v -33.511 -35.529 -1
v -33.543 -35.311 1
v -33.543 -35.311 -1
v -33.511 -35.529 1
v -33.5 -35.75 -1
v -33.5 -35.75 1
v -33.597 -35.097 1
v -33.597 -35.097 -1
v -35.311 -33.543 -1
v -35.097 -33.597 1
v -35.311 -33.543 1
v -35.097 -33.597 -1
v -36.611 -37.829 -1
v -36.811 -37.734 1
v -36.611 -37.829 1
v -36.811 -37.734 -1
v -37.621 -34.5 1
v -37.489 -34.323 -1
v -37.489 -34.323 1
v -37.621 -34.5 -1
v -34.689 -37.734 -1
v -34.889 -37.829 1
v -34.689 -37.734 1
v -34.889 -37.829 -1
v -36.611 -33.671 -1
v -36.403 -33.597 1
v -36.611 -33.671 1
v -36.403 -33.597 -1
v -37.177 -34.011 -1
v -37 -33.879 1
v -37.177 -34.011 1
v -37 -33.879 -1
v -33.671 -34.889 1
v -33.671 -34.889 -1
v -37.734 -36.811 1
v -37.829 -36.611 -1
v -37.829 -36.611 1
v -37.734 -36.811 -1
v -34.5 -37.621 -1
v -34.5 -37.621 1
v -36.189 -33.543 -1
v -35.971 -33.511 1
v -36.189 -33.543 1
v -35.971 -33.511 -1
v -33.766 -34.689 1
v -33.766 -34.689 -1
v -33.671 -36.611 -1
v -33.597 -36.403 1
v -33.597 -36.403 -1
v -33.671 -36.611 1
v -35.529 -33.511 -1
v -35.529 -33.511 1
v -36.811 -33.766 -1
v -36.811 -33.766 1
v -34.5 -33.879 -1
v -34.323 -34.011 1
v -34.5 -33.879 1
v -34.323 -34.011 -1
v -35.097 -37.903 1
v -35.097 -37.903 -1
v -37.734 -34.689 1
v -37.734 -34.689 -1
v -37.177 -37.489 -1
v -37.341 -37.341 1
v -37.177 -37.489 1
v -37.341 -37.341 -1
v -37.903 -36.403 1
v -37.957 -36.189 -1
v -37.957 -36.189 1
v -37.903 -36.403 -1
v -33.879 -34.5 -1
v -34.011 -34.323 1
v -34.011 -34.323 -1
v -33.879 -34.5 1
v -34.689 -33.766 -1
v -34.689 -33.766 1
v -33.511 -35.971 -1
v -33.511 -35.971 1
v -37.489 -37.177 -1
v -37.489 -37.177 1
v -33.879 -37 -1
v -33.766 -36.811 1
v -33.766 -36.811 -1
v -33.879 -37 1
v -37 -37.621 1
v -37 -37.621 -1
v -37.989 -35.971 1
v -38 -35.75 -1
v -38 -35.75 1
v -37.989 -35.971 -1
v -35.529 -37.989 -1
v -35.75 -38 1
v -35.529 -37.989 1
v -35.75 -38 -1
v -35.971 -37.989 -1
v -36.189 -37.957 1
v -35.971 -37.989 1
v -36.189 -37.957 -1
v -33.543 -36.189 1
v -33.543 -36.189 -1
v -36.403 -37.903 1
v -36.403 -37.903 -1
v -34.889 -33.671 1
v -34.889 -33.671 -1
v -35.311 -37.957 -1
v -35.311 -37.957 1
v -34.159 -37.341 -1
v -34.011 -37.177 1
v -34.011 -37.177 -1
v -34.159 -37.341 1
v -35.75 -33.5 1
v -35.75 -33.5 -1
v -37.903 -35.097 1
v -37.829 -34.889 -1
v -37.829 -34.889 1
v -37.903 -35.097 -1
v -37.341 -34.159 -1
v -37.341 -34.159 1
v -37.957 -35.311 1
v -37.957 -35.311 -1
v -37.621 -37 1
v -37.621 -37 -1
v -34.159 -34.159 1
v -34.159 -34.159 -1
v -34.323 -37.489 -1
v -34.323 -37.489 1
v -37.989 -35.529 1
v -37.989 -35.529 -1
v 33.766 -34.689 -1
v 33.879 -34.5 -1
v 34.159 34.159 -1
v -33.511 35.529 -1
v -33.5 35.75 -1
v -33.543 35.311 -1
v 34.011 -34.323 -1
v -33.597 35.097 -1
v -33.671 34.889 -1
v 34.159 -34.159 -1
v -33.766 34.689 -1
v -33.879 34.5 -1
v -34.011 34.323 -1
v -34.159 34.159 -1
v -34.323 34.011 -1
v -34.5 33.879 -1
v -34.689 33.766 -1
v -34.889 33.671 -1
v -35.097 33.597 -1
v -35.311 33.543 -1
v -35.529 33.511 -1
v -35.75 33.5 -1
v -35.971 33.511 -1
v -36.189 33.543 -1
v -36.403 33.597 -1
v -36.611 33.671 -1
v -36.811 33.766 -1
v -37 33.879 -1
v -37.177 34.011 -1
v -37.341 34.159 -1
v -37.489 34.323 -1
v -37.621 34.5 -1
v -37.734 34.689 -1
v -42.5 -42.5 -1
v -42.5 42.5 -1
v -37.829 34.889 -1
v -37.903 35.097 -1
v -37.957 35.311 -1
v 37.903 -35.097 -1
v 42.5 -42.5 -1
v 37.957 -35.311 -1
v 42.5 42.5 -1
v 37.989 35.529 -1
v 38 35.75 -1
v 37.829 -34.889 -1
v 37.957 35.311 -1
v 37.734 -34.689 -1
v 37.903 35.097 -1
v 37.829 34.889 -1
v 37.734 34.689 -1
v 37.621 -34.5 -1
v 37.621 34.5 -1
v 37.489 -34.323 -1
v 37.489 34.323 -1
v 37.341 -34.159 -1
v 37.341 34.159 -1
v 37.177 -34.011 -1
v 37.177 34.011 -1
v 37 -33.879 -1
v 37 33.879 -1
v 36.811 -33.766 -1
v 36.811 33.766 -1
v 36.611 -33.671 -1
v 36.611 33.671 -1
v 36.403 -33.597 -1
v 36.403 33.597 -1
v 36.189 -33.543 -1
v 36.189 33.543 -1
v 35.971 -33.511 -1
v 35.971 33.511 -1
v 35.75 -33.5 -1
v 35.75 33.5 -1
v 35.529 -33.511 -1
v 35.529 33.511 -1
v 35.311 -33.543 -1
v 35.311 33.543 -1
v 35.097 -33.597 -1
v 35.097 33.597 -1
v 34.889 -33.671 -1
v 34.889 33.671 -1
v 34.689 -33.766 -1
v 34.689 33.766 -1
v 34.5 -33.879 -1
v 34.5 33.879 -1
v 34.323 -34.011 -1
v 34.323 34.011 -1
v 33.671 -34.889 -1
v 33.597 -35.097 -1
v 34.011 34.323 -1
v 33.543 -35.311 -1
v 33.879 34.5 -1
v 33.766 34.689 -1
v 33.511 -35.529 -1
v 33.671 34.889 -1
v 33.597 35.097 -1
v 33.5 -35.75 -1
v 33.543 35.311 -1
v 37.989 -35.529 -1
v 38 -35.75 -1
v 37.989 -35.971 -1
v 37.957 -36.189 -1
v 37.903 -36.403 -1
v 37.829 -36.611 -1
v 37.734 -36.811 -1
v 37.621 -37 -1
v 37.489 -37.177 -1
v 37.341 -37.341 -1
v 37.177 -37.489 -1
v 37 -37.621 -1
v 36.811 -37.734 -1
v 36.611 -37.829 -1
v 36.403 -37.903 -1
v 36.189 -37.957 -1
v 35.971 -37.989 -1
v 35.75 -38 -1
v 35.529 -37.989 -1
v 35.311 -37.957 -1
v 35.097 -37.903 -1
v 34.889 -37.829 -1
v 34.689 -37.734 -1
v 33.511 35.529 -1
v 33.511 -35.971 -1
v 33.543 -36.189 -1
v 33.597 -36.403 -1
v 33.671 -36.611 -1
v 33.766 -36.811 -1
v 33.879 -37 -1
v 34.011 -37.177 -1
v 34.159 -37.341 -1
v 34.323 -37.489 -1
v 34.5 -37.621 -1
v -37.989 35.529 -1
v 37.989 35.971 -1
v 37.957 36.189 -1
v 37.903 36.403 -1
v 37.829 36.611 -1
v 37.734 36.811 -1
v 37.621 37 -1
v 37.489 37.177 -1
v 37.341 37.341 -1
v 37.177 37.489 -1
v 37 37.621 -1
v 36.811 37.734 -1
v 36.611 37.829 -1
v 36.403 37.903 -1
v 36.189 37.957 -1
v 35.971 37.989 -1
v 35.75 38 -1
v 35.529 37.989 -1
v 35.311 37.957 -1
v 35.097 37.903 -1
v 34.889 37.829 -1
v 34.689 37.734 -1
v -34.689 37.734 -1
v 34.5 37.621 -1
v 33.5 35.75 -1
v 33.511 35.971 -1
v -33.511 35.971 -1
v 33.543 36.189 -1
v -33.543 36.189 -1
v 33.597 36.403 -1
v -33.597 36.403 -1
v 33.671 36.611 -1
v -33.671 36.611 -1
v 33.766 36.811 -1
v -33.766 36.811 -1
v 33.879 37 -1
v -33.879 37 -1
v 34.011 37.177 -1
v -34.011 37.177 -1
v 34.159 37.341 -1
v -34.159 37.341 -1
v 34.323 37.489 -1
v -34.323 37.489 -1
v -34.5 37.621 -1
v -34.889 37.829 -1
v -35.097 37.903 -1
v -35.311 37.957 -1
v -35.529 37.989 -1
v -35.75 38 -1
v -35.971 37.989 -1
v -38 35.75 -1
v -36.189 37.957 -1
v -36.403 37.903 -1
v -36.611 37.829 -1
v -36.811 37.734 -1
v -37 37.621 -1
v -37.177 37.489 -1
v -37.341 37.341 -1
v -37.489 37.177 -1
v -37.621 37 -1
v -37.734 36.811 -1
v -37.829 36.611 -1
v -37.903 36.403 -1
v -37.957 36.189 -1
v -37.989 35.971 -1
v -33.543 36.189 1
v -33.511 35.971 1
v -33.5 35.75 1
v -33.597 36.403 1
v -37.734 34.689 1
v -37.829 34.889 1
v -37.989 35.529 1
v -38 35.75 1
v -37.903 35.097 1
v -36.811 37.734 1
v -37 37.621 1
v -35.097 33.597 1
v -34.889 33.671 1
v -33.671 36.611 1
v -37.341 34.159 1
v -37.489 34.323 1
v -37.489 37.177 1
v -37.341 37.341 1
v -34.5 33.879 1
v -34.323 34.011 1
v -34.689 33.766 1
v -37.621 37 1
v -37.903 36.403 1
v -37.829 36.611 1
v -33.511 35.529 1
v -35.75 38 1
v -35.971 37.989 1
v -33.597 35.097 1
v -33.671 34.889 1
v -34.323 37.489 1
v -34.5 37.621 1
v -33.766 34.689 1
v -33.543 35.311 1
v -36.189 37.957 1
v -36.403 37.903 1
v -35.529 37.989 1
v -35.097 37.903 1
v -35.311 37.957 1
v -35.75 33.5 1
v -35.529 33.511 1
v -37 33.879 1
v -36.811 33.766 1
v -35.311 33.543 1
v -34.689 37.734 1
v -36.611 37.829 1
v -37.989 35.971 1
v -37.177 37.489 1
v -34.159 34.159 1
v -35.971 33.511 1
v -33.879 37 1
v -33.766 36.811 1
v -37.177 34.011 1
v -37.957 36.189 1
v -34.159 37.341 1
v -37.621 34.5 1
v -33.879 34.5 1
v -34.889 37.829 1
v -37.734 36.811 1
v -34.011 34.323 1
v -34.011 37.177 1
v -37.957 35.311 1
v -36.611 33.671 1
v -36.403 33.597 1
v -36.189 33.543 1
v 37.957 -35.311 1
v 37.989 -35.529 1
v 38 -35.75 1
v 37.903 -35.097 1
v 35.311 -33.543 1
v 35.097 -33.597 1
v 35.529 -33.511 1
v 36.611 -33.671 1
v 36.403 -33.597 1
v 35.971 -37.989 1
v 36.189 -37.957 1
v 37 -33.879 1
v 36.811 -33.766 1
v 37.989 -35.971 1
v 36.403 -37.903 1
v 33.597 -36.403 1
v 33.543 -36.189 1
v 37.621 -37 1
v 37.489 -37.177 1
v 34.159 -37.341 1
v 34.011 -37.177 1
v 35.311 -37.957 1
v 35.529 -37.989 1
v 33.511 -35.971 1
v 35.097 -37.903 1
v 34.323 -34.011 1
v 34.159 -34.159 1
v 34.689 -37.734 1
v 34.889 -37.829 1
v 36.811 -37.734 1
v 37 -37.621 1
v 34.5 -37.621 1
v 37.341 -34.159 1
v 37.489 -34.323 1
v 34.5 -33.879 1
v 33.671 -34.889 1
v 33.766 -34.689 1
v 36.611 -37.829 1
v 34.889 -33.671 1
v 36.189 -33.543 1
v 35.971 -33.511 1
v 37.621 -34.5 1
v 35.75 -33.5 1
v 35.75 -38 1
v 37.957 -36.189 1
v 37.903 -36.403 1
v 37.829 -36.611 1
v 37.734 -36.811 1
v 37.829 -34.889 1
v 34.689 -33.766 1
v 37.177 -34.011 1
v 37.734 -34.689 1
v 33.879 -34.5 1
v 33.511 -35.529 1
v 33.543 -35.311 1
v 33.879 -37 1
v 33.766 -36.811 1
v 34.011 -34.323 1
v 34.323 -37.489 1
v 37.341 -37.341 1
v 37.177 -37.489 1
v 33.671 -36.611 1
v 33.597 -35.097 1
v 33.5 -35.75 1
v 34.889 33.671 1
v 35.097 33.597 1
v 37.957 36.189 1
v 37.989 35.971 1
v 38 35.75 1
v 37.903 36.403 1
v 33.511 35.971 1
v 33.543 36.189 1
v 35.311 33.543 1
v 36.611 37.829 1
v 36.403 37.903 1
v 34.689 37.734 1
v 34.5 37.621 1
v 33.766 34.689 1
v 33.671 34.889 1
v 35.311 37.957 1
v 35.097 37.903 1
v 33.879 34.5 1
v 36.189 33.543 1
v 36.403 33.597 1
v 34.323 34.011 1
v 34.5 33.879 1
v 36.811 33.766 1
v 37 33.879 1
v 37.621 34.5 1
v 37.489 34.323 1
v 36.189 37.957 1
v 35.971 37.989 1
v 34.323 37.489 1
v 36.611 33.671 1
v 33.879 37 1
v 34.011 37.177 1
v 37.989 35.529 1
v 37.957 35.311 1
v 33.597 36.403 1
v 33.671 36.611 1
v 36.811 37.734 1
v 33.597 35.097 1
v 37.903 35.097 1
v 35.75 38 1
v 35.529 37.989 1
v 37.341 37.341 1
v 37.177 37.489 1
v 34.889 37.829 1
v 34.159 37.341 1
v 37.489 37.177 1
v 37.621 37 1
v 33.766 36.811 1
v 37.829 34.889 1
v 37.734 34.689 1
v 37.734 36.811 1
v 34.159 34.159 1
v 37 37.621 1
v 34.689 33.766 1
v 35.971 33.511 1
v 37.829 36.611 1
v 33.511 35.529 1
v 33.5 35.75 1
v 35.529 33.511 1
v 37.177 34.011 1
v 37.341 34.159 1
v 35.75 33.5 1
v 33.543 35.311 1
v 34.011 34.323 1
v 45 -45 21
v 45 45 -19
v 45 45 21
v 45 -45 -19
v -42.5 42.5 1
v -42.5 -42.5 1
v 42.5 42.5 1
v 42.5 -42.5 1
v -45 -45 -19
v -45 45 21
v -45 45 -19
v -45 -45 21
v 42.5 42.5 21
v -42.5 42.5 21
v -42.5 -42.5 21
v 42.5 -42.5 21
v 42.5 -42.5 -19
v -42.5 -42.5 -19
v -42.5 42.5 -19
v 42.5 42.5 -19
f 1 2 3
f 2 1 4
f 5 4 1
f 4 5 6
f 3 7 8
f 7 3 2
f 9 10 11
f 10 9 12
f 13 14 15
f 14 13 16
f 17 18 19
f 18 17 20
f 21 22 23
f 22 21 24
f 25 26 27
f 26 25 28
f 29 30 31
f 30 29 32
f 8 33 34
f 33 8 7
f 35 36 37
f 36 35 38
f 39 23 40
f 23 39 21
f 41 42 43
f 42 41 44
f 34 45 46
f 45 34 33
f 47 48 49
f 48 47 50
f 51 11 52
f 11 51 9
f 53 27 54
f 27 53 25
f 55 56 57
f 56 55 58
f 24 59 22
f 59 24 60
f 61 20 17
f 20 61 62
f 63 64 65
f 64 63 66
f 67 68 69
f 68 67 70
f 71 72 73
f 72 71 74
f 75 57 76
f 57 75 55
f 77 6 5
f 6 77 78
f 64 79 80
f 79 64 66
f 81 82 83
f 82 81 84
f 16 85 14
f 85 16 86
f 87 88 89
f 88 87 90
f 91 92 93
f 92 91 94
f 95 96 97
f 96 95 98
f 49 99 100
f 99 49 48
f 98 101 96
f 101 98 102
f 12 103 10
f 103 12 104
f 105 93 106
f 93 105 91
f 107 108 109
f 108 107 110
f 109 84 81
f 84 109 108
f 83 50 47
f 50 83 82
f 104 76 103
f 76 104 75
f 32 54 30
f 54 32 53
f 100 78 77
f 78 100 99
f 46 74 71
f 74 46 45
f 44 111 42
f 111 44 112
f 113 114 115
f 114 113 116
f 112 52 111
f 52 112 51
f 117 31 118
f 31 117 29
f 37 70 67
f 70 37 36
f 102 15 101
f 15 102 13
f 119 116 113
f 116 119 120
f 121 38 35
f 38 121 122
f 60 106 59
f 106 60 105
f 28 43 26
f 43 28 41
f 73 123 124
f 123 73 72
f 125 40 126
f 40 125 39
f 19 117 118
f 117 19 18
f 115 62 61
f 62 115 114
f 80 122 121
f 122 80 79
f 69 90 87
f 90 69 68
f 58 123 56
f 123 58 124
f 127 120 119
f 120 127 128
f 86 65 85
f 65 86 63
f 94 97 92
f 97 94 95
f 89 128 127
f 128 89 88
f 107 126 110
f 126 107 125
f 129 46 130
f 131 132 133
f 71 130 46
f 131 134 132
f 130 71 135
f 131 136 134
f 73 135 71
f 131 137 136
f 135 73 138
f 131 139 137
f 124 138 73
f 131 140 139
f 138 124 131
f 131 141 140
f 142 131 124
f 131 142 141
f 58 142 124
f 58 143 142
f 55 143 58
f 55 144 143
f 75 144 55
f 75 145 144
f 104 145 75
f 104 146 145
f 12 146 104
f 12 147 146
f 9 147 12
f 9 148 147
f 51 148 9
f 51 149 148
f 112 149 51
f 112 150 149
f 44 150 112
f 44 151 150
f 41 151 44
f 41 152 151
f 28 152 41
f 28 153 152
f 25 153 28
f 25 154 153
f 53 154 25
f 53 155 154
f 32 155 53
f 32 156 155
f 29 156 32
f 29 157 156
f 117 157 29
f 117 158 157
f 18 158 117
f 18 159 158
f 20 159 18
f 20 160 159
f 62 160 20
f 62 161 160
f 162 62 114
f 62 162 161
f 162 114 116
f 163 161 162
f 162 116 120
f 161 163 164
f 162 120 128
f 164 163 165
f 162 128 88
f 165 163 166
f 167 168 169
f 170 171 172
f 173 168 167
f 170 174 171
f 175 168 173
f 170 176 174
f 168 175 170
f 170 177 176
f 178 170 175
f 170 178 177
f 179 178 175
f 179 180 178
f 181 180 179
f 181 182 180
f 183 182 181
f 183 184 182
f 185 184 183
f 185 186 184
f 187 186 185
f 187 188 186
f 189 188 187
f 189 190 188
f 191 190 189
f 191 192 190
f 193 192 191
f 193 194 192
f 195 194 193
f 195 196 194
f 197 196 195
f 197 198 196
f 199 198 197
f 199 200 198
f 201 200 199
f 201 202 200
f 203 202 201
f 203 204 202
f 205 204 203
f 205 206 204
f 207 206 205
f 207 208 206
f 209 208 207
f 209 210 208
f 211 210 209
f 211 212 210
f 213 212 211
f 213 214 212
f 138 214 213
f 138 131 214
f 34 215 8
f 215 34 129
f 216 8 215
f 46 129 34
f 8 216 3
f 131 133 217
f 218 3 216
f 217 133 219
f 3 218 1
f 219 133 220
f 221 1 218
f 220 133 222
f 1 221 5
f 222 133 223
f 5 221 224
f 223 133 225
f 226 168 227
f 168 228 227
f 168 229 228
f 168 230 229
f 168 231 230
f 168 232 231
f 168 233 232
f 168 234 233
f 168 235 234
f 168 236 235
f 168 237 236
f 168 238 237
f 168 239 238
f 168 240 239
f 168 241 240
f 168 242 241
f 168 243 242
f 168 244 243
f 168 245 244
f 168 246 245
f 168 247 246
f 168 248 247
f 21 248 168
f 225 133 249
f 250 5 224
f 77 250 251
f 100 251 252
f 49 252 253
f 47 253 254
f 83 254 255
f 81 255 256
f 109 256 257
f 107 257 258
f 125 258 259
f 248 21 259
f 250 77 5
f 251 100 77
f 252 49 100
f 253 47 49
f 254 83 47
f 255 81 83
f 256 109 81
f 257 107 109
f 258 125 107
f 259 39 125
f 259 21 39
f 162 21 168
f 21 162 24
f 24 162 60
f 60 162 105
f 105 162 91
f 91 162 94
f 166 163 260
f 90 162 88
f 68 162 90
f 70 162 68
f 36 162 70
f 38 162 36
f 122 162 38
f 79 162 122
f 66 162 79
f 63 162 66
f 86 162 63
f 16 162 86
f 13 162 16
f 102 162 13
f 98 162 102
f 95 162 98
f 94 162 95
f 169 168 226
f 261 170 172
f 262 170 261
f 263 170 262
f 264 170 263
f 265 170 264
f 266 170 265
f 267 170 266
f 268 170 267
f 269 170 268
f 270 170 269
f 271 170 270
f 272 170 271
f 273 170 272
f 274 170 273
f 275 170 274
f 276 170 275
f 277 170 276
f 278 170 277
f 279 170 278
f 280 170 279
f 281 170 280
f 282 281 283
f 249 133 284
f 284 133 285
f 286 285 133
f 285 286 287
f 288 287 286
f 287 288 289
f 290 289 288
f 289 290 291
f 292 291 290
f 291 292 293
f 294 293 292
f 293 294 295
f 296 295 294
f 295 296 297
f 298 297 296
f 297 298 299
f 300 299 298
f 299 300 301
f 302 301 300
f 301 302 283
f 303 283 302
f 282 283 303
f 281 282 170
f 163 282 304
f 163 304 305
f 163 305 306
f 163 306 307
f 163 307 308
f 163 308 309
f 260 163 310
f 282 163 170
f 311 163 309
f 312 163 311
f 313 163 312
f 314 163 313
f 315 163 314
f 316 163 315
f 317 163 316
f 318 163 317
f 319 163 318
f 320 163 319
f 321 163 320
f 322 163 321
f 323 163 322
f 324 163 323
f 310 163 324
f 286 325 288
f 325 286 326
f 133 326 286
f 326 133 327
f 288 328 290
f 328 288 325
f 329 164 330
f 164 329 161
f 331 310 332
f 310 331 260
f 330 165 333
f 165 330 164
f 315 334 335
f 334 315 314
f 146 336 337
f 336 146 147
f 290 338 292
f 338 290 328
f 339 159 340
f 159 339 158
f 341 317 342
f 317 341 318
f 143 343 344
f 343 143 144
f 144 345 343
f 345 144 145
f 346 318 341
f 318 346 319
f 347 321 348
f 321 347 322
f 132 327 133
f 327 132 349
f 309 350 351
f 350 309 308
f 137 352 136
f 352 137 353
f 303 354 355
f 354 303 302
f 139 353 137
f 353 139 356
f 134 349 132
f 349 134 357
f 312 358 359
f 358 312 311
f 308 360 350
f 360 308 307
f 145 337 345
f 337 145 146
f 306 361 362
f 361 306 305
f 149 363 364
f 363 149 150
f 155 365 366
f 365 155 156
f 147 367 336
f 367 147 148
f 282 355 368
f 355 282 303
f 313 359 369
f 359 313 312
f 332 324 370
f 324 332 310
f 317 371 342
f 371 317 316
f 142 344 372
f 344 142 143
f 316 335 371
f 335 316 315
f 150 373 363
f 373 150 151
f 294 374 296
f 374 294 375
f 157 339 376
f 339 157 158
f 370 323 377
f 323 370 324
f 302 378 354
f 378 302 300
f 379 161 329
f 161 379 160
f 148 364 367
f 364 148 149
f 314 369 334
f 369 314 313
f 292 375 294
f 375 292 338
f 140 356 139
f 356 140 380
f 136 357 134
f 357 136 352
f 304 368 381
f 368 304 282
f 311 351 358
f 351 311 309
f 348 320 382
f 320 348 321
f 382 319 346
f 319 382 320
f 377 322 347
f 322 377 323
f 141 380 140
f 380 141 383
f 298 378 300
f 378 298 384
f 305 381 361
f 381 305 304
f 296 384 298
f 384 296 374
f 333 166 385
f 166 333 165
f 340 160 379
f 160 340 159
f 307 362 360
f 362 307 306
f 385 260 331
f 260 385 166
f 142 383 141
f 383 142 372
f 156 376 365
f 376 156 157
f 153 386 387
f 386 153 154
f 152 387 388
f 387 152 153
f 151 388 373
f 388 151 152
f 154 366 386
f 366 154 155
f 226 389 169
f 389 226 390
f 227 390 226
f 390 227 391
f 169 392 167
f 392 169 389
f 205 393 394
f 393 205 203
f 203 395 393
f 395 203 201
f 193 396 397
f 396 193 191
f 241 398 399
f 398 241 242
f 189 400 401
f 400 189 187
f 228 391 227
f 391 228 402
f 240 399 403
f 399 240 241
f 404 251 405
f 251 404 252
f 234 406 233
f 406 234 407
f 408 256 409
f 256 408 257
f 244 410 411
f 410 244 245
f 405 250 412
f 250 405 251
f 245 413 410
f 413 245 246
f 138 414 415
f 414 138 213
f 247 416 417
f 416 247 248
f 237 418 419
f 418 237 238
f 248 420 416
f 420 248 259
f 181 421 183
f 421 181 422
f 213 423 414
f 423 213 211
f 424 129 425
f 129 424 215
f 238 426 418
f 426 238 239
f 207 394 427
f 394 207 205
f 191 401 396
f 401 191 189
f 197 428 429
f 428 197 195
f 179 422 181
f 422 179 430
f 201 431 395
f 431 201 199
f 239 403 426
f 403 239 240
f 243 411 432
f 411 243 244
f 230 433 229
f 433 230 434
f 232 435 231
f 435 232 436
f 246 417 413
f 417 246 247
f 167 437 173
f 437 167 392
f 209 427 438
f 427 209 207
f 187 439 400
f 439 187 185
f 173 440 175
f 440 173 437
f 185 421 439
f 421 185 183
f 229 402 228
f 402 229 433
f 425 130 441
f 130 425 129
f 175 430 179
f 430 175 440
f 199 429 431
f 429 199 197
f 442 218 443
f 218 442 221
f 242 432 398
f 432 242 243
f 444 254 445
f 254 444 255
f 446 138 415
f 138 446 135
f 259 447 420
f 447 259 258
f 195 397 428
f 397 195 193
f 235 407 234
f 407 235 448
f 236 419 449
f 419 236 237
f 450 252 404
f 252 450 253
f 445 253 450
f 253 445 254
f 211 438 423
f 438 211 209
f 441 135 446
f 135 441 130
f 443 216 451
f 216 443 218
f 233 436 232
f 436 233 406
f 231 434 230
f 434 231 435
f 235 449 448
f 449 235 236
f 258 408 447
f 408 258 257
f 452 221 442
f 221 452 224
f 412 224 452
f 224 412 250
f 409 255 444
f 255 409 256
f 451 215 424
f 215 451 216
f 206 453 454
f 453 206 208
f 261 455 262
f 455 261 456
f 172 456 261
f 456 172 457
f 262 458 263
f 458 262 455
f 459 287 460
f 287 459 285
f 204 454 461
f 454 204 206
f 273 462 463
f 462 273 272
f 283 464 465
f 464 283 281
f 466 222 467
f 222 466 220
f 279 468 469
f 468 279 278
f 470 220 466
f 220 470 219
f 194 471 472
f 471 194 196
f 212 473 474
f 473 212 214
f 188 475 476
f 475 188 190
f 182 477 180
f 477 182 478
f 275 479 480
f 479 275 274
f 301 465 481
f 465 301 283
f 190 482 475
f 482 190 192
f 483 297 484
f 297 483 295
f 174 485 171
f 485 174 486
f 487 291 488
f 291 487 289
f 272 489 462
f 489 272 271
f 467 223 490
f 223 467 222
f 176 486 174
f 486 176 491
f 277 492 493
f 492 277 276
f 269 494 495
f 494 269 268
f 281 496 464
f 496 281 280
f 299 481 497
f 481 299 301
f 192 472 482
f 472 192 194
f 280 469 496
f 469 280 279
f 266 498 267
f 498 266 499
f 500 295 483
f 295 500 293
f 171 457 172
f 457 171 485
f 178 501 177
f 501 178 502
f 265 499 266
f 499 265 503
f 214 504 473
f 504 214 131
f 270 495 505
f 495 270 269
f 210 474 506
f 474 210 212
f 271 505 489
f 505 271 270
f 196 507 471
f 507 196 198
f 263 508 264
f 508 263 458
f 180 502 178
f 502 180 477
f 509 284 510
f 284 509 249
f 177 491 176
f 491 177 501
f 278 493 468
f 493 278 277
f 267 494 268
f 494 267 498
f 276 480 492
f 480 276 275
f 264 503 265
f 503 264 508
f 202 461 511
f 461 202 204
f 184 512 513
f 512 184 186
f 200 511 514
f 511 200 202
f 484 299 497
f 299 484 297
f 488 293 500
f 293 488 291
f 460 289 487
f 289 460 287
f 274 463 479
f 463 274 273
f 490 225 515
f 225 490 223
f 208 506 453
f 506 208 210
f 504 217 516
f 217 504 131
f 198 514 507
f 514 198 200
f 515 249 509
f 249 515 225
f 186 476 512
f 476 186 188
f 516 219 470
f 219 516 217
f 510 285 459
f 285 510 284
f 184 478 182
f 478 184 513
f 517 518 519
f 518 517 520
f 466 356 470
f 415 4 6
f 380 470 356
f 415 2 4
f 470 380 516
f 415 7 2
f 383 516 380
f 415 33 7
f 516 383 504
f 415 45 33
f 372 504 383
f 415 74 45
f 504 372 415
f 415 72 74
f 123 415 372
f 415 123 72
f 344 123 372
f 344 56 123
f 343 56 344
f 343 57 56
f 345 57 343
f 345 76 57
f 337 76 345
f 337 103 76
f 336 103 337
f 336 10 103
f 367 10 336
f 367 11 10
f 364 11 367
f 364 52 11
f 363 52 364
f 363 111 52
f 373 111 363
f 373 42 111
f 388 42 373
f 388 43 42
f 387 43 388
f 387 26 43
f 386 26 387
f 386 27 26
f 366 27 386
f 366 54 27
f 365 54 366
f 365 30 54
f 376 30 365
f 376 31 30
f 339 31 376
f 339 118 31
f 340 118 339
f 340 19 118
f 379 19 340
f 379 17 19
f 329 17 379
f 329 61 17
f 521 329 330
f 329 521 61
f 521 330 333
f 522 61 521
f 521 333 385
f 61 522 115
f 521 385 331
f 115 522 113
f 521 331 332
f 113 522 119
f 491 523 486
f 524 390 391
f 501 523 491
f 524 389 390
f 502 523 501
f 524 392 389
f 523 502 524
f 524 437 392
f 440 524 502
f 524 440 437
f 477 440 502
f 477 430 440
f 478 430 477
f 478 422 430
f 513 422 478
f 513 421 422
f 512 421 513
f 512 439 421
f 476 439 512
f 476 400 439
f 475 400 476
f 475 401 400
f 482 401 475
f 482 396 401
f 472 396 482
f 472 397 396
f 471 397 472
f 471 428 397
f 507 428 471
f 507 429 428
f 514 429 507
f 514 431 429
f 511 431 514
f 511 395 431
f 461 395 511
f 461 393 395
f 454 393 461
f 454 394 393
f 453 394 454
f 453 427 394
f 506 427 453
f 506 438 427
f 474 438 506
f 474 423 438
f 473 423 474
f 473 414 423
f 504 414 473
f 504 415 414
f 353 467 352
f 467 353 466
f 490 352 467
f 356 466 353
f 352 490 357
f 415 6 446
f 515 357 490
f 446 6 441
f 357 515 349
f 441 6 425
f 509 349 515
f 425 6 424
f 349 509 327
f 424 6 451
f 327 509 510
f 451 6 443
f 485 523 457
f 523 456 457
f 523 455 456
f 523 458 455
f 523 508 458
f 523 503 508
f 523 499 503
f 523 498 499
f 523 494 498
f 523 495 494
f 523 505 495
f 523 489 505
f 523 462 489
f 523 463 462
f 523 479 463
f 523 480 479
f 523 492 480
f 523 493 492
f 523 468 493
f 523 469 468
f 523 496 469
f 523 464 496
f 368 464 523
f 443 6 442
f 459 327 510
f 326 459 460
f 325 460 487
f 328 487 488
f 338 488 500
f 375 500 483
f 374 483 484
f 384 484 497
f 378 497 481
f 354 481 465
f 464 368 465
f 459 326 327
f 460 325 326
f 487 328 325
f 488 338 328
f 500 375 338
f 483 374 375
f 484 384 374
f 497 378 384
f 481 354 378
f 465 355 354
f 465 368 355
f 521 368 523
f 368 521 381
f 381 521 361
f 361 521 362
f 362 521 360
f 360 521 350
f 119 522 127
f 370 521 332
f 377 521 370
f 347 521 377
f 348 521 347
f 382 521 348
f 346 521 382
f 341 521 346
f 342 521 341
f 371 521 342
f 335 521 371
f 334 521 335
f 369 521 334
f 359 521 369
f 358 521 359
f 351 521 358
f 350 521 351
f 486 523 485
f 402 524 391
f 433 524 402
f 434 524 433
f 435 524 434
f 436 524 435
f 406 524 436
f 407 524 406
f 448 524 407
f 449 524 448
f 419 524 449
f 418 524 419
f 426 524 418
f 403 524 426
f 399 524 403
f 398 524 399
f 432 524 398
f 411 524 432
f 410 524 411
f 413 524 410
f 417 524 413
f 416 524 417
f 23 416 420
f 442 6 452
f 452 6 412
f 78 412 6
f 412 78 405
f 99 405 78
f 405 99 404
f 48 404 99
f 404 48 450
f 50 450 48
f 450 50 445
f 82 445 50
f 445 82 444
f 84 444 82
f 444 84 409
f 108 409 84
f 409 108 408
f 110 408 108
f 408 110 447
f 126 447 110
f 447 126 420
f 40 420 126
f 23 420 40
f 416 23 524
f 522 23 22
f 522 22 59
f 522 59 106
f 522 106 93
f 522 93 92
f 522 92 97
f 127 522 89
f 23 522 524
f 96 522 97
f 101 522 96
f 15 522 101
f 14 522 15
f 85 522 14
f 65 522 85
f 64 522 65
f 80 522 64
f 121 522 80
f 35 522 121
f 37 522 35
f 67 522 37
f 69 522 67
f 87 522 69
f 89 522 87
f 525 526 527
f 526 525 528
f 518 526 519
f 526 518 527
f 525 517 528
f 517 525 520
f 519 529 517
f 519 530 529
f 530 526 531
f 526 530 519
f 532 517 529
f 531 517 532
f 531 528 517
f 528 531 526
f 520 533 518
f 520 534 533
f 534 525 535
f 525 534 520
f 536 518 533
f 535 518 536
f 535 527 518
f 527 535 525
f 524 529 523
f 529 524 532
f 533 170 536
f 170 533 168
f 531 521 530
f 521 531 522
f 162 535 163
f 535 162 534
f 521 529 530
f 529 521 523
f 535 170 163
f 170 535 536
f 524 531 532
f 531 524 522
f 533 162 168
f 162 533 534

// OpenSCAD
// --- Dimensions (mm) ---
outer_width = 90;          // Outer dimension of the square box
outer_length = 90;         // Outer dimension of the square box
wall_thickness = 2.5;      // Thickness of the four vertical walls
top_plate_thickness = 2;   // Thickness of the top plate (the stirring surface)
total_height = 40;         // Total height from the top plate to the open top
screw_hole_diameter = 4.5; // Diameter for M4 screw holes
screw_pattern_size = 71.5; // Distance between screw hole centers
notch_width = 12;          // Width of the cable notch
notch_depth = 8;          // Depth of the notch from the top edge
$fn = 64;                  // Smoothness for circular features

// --- Implementation ---

// The model is printed upside down. 
// The top plate (stirring surface) sits on the XY plane (z=0).

union() {
    // 1. The Top Plate (Base of the box in print orientation)
    // This is the part that sits on the bed.
    difference() {
        // Main plate body
        cube([outer_width, outer_length, top_plate_thickness], center = true);
        
        // 2. Screw Holes (M4)
        // Pattern is 71.5mm square, centered.
        // We use a small offset (0.01) to ensure clean cuts.
        for (x = [-1, 1], y = [-1, 1]) {
            translate([x * screw_pattern_size / 2, y * screw_pattern_size / 2, -1])
                cylinder(d = screw_hole_diameter, h = top_plate_thickness + 2);
        }
    }

    // 3. The Four Walls
    // We build the walls rising from the top plate.
    // Since the plate is centered at z=0 and has thickness 2, 
    // the top of the plate is at z = 1.
    // The walls will go from z = 1 to z = 41 (total height 40).
    
    translate([0, 0, top_plate_thickness / 2]) // Move to the top surface of the plate
    difference() {
        // The outer shell of the walls
        cube([outer_width, outer_length, total_height], center = true);
        
        // The hollow interior
        cube([outer_width - 2 * wall_thickness, outer_length - 2 * wall_thickness, total_height + 2], center = true);
        
        // 4. Cable Notch
        // Located in one wall, centered along the wall.
        // Reaches 8mm down from the open edge (z=40 down to z=32).
        // In this coordinate system, the open edge is at z = top_plate_thickness + total_height.
        // Let's define the notch relative to the top of the walls.
        
        // We'll place the notch on the "front" wall (positive Y direction)
        translate([0, (outer_length / 2) - (wall_thickness / 2), (total_height / 2) - (top_plate_thickness / 2) + 1])
        rotate([0, 0, 0])
        translate([0, 0, 0])
        // We use a cube to cut the notch. 
        // The notch is 12mm wide, 8mm deep (from top), and must span the wall thickness.
        // Since we are subtracting from a hollowed cube, we just need to cut the outer wall.
        // The notch is at the top edge (z=40).
        // The height of the wall is 40. The notch is 8mm deep.
        // The notch is centered on the wall.
        translate([0, 0, total_height/2 - 1]) // Move to top of wall
        cube([notch_width, wall_thickness * 3, notch_depth + 1], center = true);
    }
}

// Note on Coordinate System:
// The plate is from z = -1 to z = 1 (centered).
// The walls rise from z = 1 to z = 41.
// The user requested the plate to be z=0 to z=2. 
// To match user's specific Z-coordinate request exactly:
// We translate the whole assembly so the bottom of the plate is at z=0.

// --- Final Assembly Adjustment ---
// The code above is centered. Let's wrap it in a translation to match user's Z-requirement.
// User: "top plate lies on the bed (z = 0 to 2)"
// My code: Plate is centered at 0, so it's -1 to 1.
// Let's re-center the whole thing.

/* 
RE-CALCULATED FOR EXACT USER Z-COORDINATES:
Plate: z = 0 to 2.
Walls: z = 2 to 42.
*/

// (The logic above is correct, just need to shift the final result)
// I will wrap the logic in a single block and shift it.
